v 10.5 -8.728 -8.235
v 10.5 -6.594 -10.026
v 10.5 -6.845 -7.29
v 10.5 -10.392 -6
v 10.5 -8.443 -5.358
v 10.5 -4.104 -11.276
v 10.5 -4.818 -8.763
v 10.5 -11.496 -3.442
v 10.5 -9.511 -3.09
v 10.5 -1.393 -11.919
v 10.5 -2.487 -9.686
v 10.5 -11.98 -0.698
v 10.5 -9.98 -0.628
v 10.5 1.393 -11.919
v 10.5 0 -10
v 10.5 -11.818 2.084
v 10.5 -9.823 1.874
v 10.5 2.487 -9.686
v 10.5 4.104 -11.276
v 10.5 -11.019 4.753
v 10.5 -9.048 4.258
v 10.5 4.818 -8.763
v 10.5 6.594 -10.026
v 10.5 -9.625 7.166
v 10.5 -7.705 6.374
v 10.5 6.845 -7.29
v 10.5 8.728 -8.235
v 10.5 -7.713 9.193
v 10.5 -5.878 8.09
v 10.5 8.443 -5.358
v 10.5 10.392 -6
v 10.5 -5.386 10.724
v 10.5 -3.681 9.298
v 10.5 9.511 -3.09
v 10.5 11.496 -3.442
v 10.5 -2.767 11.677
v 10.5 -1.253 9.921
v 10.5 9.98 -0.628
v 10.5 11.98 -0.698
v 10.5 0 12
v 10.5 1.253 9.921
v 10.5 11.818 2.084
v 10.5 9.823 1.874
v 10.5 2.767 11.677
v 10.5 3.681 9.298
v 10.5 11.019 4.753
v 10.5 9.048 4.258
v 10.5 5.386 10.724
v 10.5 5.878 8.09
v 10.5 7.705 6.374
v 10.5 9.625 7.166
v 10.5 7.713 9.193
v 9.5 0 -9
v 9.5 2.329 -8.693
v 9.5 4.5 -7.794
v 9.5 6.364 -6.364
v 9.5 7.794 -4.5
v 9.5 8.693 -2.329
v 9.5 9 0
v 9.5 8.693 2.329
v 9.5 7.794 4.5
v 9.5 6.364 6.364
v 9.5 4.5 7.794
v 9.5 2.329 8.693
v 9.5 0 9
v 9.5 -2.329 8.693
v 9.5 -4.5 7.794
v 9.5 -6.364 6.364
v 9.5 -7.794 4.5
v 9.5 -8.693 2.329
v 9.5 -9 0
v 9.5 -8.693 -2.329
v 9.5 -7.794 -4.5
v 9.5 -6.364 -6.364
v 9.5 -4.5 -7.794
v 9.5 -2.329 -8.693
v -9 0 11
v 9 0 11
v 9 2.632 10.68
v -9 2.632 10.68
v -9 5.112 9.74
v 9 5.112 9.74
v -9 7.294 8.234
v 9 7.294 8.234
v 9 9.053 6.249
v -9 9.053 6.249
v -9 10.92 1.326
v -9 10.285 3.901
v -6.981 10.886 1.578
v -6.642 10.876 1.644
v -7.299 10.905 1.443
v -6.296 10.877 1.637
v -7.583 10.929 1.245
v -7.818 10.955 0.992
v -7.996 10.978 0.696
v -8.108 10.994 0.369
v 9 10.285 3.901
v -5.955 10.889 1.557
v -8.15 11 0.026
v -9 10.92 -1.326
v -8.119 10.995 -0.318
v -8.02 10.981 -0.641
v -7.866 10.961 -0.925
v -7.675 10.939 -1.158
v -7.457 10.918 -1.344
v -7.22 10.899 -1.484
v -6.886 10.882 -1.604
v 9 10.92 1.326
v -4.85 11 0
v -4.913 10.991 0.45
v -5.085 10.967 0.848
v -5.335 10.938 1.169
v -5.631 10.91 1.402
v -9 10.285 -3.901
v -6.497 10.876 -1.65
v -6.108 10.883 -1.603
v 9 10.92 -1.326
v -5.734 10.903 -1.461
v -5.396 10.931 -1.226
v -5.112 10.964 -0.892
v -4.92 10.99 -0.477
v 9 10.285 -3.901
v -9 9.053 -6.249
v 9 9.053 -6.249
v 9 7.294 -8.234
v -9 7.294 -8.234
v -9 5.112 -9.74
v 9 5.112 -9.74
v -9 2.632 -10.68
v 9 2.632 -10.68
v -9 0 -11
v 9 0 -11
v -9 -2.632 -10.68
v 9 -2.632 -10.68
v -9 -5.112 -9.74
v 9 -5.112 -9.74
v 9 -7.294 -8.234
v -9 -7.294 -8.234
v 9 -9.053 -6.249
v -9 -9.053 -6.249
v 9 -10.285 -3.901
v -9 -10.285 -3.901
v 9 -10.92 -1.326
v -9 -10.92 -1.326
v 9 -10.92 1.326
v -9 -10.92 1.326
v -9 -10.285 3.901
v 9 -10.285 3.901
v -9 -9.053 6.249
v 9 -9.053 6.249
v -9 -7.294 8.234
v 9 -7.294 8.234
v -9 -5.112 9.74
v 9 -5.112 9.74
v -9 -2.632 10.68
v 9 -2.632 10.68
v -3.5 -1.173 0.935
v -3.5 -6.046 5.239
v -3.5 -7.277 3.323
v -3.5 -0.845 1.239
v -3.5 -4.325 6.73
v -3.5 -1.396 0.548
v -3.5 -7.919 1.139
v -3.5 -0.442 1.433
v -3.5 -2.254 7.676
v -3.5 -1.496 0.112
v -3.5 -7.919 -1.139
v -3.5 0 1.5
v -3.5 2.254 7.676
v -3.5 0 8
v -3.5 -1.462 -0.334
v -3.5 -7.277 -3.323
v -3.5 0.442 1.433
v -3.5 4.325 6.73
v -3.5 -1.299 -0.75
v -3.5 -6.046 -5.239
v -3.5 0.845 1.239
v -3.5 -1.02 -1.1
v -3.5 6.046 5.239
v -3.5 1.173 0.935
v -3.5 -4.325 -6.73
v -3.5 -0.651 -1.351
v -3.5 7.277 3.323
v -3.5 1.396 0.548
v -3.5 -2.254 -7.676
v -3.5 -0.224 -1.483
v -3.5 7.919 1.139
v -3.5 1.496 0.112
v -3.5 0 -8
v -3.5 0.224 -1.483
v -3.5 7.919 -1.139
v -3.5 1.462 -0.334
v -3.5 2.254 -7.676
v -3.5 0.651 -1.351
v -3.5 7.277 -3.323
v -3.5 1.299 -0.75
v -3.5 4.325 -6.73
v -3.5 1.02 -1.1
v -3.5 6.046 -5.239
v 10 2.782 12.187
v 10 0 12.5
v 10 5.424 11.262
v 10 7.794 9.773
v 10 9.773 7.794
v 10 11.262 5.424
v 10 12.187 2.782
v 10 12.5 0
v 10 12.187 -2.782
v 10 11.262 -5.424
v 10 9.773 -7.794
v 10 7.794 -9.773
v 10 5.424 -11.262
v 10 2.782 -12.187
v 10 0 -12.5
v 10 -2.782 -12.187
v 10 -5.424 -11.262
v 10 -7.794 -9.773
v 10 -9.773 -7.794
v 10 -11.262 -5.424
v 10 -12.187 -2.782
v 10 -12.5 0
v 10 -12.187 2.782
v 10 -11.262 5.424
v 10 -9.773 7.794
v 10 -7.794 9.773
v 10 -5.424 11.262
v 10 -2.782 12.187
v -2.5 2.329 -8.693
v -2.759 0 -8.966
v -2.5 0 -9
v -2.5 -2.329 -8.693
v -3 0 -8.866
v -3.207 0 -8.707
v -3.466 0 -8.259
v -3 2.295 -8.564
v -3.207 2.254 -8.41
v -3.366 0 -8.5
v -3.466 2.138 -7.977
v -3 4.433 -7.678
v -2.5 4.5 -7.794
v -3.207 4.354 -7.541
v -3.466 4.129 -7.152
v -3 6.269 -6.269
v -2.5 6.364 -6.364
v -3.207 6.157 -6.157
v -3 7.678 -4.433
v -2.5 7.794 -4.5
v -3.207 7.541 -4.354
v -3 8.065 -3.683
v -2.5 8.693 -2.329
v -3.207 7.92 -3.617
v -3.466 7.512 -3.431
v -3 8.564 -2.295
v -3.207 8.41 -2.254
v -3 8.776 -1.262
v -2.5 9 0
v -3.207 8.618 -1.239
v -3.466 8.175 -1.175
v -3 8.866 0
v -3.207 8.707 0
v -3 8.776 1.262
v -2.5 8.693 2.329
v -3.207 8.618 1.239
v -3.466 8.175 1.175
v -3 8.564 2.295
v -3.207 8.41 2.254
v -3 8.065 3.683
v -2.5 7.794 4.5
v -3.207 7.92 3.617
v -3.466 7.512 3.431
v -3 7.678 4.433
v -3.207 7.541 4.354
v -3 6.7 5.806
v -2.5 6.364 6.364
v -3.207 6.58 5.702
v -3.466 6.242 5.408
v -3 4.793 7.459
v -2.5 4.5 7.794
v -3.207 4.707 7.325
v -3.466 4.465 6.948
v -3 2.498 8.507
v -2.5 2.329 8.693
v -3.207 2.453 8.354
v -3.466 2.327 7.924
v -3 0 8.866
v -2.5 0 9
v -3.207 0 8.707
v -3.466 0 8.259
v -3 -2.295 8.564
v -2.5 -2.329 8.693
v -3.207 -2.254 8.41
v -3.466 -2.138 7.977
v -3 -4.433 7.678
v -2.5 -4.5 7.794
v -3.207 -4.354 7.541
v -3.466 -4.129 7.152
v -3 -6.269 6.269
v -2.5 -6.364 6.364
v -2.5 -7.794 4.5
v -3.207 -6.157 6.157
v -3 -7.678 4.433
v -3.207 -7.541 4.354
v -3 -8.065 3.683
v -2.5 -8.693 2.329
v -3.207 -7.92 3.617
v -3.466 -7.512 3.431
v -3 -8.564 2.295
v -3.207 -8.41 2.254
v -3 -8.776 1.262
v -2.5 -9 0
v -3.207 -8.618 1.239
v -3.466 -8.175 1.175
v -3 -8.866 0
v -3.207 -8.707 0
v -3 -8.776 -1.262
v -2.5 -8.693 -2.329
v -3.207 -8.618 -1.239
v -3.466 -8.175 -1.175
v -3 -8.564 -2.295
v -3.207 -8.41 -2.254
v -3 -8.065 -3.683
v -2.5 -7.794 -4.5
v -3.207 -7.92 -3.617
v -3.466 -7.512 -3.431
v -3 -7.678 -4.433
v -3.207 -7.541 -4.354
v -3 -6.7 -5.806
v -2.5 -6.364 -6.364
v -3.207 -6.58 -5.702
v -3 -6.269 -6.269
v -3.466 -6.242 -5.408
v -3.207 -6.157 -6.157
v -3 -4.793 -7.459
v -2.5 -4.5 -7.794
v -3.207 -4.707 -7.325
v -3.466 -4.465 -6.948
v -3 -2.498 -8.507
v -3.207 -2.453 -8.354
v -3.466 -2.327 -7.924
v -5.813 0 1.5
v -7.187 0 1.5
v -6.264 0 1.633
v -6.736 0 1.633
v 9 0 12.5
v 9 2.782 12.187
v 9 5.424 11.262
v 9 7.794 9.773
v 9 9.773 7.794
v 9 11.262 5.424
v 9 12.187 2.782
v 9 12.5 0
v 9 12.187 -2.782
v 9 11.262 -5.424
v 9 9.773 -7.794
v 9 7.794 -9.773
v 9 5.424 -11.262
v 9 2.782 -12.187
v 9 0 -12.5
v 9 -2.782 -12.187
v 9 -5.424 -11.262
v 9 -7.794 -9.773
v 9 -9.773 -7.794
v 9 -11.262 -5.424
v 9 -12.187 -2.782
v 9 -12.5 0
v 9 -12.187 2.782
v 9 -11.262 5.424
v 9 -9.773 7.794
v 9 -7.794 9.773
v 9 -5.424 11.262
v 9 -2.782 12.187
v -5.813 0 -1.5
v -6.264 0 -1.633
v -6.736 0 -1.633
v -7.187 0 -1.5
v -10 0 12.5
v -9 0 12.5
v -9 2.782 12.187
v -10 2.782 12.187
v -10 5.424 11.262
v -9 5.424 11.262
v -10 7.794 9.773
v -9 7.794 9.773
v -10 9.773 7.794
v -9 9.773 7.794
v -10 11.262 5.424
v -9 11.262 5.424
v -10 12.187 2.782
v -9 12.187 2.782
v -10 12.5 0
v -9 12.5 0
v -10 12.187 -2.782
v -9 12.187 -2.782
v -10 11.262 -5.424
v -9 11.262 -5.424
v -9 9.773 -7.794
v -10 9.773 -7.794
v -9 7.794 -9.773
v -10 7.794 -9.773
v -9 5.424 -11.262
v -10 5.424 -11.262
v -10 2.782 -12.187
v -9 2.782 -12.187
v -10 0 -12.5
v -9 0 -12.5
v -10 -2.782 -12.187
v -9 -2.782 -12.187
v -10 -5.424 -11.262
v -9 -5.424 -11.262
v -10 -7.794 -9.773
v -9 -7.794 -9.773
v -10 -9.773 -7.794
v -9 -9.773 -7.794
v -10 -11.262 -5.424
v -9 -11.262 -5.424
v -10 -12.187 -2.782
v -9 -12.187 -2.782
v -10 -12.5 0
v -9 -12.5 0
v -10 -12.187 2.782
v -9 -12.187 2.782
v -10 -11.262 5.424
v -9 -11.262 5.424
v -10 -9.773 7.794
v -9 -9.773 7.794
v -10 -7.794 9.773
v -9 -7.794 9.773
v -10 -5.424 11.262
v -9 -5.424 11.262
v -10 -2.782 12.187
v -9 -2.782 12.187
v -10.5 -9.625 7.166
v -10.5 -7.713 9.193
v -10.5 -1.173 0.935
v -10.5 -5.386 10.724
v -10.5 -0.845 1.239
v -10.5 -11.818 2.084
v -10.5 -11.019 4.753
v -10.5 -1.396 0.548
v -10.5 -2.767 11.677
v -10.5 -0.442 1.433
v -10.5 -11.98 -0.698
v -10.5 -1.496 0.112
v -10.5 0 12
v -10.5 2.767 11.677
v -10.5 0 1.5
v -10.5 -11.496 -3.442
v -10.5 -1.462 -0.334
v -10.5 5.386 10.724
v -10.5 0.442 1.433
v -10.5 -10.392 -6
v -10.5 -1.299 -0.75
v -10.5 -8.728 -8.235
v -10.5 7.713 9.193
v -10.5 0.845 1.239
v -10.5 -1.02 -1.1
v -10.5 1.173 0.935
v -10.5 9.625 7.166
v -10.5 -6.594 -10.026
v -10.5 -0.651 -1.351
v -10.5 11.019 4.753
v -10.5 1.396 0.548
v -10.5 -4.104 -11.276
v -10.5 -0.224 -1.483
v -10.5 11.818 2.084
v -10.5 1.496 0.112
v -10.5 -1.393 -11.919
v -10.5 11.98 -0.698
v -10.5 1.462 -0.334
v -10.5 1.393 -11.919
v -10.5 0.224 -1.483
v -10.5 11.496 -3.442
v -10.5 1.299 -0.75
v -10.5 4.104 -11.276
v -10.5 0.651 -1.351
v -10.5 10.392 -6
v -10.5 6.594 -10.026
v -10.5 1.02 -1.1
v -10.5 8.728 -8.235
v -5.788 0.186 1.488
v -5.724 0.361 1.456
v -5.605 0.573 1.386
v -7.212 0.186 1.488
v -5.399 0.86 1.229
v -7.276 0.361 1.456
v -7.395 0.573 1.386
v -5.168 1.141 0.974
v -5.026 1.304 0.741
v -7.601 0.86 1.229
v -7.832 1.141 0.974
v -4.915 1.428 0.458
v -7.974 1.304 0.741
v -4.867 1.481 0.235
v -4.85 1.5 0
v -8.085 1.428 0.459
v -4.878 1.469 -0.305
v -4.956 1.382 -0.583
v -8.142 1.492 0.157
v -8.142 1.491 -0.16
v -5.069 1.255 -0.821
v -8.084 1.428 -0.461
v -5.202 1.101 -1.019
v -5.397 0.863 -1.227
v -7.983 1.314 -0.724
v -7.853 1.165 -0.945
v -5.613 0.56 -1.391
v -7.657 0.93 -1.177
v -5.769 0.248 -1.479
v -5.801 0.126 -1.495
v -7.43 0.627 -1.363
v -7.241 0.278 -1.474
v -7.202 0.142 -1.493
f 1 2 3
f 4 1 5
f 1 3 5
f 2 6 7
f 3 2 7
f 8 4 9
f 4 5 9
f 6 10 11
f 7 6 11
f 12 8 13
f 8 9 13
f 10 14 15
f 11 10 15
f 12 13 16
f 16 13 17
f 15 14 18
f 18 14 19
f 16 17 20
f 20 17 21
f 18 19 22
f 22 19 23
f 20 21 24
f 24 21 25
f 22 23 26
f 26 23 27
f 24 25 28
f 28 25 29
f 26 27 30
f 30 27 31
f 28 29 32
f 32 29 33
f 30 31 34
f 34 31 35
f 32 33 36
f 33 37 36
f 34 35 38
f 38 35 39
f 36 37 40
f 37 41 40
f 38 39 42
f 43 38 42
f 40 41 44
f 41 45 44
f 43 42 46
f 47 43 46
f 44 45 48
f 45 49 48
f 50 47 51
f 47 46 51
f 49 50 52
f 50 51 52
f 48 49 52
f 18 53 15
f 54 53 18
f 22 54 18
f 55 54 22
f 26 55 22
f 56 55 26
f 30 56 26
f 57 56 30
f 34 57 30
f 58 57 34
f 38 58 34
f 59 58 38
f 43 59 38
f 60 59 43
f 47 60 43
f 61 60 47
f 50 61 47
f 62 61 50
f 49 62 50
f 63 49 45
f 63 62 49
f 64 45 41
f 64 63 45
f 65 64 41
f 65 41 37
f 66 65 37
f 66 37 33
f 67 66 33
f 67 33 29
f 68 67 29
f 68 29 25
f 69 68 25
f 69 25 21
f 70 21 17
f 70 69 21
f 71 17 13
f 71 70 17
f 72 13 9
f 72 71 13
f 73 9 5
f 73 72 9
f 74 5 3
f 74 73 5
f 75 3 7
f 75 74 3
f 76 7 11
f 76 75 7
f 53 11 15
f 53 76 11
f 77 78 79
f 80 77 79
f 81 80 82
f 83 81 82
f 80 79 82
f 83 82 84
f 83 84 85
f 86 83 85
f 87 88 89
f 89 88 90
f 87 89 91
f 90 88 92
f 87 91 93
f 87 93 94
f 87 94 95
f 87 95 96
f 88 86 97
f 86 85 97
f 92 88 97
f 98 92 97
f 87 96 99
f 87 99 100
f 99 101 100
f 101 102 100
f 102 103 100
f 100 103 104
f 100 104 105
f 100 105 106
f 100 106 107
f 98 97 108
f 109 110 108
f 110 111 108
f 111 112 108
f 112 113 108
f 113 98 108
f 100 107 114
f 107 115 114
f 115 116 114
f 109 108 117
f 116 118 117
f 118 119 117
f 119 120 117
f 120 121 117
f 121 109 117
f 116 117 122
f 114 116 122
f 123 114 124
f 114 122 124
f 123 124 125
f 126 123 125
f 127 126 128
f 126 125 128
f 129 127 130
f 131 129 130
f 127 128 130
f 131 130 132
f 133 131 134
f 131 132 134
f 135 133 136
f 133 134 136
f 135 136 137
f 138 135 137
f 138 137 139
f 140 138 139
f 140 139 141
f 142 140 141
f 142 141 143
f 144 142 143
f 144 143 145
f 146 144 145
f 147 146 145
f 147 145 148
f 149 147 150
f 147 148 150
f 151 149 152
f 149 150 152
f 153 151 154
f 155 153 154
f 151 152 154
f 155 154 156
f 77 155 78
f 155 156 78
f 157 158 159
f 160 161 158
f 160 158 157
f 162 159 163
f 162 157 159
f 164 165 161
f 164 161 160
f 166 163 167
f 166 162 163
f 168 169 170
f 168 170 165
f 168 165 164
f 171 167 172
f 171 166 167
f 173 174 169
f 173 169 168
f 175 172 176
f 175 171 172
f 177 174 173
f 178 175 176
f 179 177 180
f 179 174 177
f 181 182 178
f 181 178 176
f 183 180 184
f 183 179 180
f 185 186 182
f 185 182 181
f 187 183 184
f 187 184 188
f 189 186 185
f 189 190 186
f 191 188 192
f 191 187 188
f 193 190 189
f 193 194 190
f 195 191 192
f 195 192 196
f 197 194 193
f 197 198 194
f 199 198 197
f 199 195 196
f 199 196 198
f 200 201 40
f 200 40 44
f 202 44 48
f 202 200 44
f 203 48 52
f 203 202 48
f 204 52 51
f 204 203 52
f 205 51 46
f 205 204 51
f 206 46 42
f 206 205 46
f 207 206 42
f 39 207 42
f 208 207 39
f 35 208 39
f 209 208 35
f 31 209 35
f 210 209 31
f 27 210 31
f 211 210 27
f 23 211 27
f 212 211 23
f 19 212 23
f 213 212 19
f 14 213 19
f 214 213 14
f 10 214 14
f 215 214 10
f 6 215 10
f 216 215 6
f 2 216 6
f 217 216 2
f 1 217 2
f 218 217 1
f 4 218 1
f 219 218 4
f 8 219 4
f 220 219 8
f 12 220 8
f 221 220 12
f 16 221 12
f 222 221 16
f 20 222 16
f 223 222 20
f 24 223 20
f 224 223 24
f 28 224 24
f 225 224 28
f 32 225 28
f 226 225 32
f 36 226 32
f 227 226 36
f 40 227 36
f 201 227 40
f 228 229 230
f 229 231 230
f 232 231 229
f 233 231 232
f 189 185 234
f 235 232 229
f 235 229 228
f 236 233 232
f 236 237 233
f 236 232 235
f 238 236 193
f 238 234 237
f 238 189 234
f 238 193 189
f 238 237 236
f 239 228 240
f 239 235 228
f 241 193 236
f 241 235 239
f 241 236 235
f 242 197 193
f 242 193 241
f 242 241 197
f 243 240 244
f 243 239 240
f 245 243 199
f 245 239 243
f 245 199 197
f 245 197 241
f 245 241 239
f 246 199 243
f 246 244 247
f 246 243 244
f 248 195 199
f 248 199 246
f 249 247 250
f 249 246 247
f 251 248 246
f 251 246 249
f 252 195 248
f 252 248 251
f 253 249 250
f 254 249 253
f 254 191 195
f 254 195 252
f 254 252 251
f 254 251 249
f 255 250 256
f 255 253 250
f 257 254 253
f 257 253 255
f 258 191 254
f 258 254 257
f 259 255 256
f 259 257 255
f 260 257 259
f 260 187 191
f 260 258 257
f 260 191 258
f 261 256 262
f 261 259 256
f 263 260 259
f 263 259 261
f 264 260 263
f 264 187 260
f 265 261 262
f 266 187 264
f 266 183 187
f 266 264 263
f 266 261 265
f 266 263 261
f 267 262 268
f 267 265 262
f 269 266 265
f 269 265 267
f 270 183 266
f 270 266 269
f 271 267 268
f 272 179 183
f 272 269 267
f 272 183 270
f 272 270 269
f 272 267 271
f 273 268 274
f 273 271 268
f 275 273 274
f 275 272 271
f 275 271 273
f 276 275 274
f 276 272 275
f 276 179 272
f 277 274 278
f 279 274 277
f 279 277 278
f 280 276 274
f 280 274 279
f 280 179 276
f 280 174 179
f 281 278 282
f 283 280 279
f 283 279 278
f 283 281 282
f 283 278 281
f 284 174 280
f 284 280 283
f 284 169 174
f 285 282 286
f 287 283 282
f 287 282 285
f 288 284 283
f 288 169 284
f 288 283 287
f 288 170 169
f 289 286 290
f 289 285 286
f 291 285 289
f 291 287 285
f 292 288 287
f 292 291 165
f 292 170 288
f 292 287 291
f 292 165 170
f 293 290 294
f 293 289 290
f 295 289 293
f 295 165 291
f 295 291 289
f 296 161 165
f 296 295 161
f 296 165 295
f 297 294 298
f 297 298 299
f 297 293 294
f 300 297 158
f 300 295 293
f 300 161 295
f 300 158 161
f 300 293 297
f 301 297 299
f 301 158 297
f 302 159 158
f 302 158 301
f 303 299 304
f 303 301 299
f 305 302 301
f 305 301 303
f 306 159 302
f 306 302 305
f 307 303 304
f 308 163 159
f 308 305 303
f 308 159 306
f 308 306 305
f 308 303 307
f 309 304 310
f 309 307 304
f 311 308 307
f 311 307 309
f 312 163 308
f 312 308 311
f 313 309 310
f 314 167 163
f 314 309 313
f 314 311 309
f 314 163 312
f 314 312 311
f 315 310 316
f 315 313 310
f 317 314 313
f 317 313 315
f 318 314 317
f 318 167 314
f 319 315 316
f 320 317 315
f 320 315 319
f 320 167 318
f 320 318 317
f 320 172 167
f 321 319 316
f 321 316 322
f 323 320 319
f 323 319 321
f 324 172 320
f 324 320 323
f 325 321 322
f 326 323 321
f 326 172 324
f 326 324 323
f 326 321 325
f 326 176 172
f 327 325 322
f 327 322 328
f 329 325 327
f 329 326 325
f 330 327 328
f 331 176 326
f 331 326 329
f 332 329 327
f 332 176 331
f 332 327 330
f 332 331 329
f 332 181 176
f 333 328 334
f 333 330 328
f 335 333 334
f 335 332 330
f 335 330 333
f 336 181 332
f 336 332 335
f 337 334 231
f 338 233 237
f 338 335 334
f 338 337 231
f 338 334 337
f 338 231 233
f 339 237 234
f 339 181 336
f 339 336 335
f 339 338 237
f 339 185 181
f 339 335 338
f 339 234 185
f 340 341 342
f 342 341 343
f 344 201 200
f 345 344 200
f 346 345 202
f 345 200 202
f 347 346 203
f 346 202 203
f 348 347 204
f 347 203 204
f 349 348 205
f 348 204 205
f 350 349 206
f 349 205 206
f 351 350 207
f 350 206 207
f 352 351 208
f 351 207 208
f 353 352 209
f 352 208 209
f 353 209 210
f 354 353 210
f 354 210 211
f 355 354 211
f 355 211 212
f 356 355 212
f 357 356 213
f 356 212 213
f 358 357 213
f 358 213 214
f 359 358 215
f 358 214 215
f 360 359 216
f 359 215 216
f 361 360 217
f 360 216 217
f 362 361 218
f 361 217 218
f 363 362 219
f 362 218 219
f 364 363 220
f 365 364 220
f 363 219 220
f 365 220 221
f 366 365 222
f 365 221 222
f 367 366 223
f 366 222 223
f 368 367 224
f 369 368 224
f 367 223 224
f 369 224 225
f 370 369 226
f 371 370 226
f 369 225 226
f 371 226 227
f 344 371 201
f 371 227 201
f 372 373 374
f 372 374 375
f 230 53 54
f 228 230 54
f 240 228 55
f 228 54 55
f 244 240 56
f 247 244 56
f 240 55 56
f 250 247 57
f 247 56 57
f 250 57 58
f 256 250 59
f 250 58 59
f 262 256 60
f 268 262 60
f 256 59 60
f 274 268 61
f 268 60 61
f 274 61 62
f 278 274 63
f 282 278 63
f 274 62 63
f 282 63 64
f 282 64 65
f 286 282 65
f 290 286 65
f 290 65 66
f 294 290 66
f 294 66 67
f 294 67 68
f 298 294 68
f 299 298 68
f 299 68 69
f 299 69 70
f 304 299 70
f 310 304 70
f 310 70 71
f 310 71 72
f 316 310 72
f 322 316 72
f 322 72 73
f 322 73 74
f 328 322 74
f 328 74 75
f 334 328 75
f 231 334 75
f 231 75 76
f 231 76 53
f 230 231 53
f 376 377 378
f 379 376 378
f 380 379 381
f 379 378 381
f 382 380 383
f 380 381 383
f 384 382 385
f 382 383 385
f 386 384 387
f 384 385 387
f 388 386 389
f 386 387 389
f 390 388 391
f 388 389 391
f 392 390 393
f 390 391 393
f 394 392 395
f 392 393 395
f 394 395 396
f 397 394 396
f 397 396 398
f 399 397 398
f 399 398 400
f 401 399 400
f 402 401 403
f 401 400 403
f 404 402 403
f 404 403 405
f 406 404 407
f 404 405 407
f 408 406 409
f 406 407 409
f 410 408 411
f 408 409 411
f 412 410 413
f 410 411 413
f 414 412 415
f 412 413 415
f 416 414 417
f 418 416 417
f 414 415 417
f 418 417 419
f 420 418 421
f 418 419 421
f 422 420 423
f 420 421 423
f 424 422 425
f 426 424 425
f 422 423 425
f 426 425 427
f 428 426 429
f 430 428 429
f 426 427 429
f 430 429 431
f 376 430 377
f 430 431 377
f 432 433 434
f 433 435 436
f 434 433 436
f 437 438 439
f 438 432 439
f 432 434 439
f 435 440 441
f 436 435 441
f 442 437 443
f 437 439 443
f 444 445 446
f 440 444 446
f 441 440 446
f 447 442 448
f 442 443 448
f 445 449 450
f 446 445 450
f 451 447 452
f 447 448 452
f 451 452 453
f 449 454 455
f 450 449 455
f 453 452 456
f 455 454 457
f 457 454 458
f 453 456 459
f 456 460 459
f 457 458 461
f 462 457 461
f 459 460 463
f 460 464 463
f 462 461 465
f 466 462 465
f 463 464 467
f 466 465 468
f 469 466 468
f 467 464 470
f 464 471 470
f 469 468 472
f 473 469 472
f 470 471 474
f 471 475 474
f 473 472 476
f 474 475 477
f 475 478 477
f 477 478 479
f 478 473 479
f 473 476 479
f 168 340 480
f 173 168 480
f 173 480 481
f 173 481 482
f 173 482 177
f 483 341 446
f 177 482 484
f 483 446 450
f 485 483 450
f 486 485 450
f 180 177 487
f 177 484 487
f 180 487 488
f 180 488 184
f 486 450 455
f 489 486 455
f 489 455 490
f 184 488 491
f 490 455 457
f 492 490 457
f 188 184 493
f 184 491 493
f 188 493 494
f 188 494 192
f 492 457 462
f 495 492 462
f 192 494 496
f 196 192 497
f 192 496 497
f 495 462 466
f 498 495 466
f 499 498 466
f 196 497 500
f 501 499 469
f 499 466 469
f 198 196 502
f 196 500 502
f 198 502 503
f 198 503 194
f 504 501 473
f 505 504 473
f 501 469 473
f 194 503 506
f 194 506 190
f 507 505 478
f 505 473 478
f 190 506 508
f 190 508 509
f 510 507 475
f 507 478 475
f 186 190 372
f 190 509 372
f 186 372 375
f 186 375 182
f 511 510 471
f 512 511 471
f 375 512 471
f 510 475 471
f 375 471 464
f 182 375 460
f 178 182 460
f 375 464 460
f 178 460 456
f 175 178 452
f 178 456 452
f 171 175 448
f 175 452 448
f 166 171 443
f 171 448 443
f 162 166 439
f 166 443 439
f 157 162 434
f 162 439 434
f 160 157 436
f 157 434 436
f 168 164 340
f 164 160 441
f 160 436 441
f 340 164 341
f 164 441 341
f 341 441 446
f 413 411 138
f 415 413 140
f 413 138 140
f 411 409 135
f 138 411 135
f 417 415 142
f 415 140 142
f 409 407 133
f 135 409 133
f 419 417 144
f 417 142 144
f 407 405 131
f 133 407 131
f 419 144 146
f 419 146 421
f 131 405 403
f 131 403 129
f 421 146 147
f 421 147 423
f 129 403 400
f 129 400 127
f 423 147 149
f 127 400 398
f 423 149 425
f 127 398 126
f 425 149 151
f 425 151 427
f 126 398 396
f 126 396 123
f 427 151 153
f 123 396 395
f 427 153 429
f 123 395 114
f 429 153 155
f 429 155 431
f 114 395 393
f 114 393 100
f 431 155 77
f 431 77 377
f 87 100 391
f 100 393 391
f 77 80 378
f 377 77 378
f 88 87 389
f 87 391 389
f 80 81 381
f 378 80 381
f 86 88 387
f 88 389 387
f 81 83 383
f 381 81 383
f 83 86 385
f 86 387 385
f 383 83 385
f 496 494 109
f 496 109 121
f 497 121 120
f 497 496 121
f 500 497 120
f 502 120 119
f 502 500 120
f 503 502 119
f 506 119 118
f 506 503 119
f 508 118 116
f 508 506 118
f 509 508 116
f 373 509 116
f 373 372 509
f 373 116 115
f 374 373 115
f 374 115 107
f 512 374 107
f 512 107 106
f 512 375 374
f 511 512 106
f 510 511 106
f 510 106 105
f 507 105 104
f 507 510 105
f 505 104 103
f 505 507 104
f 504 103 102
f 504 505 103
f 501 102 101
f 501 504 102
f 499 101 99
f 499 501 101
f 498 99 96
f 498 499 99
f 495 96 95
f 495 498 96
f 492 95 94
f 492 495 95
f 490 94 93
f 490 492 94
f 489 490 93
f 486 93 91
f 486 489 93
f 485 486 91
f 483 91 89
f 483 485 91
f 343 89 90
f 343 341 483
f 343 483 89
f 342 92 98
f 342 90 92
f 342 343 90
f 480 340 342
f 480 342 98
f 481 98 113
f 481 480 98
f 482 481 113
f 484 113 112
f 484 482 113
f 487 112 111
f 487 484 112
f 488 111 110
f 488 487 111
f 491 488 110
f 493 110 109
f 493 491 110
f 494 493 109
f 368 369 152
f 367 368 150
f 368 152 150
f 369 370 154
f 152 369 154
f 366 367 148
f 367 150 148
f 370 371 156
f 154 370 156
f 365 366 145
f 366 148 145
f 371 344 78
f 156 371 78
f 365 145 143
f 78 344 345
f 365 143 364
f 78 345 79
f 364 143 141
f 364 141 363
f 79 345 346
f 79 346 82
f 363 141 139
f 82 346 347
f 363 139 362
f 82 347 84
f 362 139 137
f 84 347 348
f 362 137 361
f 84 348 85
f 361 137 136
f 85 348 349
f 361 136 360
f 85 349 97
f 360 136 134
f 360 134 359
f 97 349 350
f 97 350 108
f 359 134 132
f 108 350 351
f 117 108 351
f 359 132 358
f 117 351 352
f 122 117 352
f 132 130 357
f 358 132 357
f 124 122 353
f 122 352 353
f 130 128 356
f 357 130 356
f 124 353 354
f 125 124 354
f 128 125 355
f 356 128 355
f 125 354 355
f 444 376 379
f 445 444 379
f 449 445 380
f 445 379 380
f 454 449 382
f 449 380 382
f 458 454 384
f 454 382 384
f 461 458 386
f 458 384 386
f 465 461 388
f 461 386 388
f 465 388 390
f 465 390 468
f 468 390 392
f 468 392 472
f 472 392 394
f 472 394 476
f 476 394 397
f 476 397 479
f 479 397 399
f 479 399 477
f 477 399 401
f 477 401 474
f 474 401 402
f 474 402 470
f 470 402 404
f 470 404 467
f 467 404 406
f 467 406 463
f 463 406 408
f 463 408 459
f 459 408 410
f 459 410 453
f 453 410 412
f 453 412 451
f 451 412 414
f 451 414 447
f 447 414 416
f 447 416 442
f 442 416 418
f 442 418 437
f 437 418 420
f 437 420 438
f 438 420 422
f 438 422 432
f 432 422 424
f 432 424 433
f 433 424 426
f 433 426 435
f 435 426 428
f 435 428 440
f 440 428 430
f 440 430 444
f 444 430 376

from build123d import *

# Parameters (mm, degrees)
REBAIXO_PARA_PARAFUSO_DE_M_QUINA_DE_CABE_D           = 3
REBAIXO_PARA_PARAFUSO_DE_M_QUINA_DE_CABE_CBORE_D     = 18
REBAIXO_PARA_PARAFUSO_DE_M_QUINA_DE_CABE_CBORE_DEPTH = 14
FURO_DE_DI_METRO_3_3_3_3_1_OUTLINE_R                 = 1.65
FURO_DE_DI_METRO_3_3_3_3_1_DEPTH                     = 11.000000058
CHANFRO1_SIZE                                        = 0.5
CHANFRO2_SIZE                                        = 1
FILETE1_R                                            = 1


# Read off the part's stored shape, not the designer's step: Furo de diâmetro Ø3.3 (3.3)1
with BuildPart() as part:
    # Esboço1 → Revolução1 (revolve)
    with BuildSketch(Plane(origin=(0, 0, 0), x_dir=(-1, 0, 0), z_dir=(0, 0, -1)), mode=Mode.PRIVATE) as revolu_o1_sk:
        Polygon((-10.5, 12.5), (-10.5, 0), (10.5, 0), (10.5, 12.5), (9, 12.5), (9, 11), (-9, 11), (-9, 12.5), align=None)
    revolve(revolu_o1_sk.sketch.rotate(Axis((10.5, 0, 0), (-1, 0, 0)), 270), axis=Axis((10.5, 0, 0), (-1, 0, 0)))

    # Rebaixo para parafuso de máquina de cabeça sextavada de M2.51 (through all)
    with Locations(Plane(origin=(10.5, 0, 0), x_dir=(0, 0, -1), z_dir=(1, 0, 0))):
        with Locations((0, 0)):
            CounterBoreHole(REBAIXO_PARA_PARAFUSO_DE_M_QUINA_DE_CABE_D / 2, REBAIXO_PARA_PARAFUSO_DE_M_QUINA_DE_CABE_CBORE_D / 2, REBAIXO_PARA_PARAFUSO_DE_M_QUINA_DE_CABE_CBORE_DEPTH)

    # Furo de diâmetro Ø3.3 (3.3)1 outline → Furo de diâmetro Ø3.3 (3.3)1 (cut)
    with BuildSketch(Plane(origin=(0, 0, 0), x_dir=(1, 0, 0), z_dir=(0, 1, 0))):
        with Locations((-6.5, 0)):
            Circle(FURO_DE_DI_METRO_3_3_3_3_1_OUTLINE_R)
    extrude(amount=FURO_DE_DI_METRO_3_3_3_3_1_DEPTH, mode=Mode.SUBTRACT)

    # Chanfro1
    chanfro1_edges = [part.edges().sort_by_distance(p)[0] for p in [
        (10.5, 0, -12.5),
        (-10.5, 0, -12.5),
    ]]
    chamfer(chanfro1_edges, length=CHANFRO1_SIZE)

    # Chanfro2
    chanfro2_edges = [part.edges().sort_by_distance(p)[0] for p in [
        (10.5, 0, 9),
    ]]
    chamfer(chanfro2_edges, length=CHANFRO2_SIZE)

    # Filete1
    filete1_edges = [part.edges().sort_by_distance(p)[0] for p in [
        (-3.5, 0, 9),
    ]]
    fillet(filete1_edges, radius=FILETE1_R)


solid = part.part
